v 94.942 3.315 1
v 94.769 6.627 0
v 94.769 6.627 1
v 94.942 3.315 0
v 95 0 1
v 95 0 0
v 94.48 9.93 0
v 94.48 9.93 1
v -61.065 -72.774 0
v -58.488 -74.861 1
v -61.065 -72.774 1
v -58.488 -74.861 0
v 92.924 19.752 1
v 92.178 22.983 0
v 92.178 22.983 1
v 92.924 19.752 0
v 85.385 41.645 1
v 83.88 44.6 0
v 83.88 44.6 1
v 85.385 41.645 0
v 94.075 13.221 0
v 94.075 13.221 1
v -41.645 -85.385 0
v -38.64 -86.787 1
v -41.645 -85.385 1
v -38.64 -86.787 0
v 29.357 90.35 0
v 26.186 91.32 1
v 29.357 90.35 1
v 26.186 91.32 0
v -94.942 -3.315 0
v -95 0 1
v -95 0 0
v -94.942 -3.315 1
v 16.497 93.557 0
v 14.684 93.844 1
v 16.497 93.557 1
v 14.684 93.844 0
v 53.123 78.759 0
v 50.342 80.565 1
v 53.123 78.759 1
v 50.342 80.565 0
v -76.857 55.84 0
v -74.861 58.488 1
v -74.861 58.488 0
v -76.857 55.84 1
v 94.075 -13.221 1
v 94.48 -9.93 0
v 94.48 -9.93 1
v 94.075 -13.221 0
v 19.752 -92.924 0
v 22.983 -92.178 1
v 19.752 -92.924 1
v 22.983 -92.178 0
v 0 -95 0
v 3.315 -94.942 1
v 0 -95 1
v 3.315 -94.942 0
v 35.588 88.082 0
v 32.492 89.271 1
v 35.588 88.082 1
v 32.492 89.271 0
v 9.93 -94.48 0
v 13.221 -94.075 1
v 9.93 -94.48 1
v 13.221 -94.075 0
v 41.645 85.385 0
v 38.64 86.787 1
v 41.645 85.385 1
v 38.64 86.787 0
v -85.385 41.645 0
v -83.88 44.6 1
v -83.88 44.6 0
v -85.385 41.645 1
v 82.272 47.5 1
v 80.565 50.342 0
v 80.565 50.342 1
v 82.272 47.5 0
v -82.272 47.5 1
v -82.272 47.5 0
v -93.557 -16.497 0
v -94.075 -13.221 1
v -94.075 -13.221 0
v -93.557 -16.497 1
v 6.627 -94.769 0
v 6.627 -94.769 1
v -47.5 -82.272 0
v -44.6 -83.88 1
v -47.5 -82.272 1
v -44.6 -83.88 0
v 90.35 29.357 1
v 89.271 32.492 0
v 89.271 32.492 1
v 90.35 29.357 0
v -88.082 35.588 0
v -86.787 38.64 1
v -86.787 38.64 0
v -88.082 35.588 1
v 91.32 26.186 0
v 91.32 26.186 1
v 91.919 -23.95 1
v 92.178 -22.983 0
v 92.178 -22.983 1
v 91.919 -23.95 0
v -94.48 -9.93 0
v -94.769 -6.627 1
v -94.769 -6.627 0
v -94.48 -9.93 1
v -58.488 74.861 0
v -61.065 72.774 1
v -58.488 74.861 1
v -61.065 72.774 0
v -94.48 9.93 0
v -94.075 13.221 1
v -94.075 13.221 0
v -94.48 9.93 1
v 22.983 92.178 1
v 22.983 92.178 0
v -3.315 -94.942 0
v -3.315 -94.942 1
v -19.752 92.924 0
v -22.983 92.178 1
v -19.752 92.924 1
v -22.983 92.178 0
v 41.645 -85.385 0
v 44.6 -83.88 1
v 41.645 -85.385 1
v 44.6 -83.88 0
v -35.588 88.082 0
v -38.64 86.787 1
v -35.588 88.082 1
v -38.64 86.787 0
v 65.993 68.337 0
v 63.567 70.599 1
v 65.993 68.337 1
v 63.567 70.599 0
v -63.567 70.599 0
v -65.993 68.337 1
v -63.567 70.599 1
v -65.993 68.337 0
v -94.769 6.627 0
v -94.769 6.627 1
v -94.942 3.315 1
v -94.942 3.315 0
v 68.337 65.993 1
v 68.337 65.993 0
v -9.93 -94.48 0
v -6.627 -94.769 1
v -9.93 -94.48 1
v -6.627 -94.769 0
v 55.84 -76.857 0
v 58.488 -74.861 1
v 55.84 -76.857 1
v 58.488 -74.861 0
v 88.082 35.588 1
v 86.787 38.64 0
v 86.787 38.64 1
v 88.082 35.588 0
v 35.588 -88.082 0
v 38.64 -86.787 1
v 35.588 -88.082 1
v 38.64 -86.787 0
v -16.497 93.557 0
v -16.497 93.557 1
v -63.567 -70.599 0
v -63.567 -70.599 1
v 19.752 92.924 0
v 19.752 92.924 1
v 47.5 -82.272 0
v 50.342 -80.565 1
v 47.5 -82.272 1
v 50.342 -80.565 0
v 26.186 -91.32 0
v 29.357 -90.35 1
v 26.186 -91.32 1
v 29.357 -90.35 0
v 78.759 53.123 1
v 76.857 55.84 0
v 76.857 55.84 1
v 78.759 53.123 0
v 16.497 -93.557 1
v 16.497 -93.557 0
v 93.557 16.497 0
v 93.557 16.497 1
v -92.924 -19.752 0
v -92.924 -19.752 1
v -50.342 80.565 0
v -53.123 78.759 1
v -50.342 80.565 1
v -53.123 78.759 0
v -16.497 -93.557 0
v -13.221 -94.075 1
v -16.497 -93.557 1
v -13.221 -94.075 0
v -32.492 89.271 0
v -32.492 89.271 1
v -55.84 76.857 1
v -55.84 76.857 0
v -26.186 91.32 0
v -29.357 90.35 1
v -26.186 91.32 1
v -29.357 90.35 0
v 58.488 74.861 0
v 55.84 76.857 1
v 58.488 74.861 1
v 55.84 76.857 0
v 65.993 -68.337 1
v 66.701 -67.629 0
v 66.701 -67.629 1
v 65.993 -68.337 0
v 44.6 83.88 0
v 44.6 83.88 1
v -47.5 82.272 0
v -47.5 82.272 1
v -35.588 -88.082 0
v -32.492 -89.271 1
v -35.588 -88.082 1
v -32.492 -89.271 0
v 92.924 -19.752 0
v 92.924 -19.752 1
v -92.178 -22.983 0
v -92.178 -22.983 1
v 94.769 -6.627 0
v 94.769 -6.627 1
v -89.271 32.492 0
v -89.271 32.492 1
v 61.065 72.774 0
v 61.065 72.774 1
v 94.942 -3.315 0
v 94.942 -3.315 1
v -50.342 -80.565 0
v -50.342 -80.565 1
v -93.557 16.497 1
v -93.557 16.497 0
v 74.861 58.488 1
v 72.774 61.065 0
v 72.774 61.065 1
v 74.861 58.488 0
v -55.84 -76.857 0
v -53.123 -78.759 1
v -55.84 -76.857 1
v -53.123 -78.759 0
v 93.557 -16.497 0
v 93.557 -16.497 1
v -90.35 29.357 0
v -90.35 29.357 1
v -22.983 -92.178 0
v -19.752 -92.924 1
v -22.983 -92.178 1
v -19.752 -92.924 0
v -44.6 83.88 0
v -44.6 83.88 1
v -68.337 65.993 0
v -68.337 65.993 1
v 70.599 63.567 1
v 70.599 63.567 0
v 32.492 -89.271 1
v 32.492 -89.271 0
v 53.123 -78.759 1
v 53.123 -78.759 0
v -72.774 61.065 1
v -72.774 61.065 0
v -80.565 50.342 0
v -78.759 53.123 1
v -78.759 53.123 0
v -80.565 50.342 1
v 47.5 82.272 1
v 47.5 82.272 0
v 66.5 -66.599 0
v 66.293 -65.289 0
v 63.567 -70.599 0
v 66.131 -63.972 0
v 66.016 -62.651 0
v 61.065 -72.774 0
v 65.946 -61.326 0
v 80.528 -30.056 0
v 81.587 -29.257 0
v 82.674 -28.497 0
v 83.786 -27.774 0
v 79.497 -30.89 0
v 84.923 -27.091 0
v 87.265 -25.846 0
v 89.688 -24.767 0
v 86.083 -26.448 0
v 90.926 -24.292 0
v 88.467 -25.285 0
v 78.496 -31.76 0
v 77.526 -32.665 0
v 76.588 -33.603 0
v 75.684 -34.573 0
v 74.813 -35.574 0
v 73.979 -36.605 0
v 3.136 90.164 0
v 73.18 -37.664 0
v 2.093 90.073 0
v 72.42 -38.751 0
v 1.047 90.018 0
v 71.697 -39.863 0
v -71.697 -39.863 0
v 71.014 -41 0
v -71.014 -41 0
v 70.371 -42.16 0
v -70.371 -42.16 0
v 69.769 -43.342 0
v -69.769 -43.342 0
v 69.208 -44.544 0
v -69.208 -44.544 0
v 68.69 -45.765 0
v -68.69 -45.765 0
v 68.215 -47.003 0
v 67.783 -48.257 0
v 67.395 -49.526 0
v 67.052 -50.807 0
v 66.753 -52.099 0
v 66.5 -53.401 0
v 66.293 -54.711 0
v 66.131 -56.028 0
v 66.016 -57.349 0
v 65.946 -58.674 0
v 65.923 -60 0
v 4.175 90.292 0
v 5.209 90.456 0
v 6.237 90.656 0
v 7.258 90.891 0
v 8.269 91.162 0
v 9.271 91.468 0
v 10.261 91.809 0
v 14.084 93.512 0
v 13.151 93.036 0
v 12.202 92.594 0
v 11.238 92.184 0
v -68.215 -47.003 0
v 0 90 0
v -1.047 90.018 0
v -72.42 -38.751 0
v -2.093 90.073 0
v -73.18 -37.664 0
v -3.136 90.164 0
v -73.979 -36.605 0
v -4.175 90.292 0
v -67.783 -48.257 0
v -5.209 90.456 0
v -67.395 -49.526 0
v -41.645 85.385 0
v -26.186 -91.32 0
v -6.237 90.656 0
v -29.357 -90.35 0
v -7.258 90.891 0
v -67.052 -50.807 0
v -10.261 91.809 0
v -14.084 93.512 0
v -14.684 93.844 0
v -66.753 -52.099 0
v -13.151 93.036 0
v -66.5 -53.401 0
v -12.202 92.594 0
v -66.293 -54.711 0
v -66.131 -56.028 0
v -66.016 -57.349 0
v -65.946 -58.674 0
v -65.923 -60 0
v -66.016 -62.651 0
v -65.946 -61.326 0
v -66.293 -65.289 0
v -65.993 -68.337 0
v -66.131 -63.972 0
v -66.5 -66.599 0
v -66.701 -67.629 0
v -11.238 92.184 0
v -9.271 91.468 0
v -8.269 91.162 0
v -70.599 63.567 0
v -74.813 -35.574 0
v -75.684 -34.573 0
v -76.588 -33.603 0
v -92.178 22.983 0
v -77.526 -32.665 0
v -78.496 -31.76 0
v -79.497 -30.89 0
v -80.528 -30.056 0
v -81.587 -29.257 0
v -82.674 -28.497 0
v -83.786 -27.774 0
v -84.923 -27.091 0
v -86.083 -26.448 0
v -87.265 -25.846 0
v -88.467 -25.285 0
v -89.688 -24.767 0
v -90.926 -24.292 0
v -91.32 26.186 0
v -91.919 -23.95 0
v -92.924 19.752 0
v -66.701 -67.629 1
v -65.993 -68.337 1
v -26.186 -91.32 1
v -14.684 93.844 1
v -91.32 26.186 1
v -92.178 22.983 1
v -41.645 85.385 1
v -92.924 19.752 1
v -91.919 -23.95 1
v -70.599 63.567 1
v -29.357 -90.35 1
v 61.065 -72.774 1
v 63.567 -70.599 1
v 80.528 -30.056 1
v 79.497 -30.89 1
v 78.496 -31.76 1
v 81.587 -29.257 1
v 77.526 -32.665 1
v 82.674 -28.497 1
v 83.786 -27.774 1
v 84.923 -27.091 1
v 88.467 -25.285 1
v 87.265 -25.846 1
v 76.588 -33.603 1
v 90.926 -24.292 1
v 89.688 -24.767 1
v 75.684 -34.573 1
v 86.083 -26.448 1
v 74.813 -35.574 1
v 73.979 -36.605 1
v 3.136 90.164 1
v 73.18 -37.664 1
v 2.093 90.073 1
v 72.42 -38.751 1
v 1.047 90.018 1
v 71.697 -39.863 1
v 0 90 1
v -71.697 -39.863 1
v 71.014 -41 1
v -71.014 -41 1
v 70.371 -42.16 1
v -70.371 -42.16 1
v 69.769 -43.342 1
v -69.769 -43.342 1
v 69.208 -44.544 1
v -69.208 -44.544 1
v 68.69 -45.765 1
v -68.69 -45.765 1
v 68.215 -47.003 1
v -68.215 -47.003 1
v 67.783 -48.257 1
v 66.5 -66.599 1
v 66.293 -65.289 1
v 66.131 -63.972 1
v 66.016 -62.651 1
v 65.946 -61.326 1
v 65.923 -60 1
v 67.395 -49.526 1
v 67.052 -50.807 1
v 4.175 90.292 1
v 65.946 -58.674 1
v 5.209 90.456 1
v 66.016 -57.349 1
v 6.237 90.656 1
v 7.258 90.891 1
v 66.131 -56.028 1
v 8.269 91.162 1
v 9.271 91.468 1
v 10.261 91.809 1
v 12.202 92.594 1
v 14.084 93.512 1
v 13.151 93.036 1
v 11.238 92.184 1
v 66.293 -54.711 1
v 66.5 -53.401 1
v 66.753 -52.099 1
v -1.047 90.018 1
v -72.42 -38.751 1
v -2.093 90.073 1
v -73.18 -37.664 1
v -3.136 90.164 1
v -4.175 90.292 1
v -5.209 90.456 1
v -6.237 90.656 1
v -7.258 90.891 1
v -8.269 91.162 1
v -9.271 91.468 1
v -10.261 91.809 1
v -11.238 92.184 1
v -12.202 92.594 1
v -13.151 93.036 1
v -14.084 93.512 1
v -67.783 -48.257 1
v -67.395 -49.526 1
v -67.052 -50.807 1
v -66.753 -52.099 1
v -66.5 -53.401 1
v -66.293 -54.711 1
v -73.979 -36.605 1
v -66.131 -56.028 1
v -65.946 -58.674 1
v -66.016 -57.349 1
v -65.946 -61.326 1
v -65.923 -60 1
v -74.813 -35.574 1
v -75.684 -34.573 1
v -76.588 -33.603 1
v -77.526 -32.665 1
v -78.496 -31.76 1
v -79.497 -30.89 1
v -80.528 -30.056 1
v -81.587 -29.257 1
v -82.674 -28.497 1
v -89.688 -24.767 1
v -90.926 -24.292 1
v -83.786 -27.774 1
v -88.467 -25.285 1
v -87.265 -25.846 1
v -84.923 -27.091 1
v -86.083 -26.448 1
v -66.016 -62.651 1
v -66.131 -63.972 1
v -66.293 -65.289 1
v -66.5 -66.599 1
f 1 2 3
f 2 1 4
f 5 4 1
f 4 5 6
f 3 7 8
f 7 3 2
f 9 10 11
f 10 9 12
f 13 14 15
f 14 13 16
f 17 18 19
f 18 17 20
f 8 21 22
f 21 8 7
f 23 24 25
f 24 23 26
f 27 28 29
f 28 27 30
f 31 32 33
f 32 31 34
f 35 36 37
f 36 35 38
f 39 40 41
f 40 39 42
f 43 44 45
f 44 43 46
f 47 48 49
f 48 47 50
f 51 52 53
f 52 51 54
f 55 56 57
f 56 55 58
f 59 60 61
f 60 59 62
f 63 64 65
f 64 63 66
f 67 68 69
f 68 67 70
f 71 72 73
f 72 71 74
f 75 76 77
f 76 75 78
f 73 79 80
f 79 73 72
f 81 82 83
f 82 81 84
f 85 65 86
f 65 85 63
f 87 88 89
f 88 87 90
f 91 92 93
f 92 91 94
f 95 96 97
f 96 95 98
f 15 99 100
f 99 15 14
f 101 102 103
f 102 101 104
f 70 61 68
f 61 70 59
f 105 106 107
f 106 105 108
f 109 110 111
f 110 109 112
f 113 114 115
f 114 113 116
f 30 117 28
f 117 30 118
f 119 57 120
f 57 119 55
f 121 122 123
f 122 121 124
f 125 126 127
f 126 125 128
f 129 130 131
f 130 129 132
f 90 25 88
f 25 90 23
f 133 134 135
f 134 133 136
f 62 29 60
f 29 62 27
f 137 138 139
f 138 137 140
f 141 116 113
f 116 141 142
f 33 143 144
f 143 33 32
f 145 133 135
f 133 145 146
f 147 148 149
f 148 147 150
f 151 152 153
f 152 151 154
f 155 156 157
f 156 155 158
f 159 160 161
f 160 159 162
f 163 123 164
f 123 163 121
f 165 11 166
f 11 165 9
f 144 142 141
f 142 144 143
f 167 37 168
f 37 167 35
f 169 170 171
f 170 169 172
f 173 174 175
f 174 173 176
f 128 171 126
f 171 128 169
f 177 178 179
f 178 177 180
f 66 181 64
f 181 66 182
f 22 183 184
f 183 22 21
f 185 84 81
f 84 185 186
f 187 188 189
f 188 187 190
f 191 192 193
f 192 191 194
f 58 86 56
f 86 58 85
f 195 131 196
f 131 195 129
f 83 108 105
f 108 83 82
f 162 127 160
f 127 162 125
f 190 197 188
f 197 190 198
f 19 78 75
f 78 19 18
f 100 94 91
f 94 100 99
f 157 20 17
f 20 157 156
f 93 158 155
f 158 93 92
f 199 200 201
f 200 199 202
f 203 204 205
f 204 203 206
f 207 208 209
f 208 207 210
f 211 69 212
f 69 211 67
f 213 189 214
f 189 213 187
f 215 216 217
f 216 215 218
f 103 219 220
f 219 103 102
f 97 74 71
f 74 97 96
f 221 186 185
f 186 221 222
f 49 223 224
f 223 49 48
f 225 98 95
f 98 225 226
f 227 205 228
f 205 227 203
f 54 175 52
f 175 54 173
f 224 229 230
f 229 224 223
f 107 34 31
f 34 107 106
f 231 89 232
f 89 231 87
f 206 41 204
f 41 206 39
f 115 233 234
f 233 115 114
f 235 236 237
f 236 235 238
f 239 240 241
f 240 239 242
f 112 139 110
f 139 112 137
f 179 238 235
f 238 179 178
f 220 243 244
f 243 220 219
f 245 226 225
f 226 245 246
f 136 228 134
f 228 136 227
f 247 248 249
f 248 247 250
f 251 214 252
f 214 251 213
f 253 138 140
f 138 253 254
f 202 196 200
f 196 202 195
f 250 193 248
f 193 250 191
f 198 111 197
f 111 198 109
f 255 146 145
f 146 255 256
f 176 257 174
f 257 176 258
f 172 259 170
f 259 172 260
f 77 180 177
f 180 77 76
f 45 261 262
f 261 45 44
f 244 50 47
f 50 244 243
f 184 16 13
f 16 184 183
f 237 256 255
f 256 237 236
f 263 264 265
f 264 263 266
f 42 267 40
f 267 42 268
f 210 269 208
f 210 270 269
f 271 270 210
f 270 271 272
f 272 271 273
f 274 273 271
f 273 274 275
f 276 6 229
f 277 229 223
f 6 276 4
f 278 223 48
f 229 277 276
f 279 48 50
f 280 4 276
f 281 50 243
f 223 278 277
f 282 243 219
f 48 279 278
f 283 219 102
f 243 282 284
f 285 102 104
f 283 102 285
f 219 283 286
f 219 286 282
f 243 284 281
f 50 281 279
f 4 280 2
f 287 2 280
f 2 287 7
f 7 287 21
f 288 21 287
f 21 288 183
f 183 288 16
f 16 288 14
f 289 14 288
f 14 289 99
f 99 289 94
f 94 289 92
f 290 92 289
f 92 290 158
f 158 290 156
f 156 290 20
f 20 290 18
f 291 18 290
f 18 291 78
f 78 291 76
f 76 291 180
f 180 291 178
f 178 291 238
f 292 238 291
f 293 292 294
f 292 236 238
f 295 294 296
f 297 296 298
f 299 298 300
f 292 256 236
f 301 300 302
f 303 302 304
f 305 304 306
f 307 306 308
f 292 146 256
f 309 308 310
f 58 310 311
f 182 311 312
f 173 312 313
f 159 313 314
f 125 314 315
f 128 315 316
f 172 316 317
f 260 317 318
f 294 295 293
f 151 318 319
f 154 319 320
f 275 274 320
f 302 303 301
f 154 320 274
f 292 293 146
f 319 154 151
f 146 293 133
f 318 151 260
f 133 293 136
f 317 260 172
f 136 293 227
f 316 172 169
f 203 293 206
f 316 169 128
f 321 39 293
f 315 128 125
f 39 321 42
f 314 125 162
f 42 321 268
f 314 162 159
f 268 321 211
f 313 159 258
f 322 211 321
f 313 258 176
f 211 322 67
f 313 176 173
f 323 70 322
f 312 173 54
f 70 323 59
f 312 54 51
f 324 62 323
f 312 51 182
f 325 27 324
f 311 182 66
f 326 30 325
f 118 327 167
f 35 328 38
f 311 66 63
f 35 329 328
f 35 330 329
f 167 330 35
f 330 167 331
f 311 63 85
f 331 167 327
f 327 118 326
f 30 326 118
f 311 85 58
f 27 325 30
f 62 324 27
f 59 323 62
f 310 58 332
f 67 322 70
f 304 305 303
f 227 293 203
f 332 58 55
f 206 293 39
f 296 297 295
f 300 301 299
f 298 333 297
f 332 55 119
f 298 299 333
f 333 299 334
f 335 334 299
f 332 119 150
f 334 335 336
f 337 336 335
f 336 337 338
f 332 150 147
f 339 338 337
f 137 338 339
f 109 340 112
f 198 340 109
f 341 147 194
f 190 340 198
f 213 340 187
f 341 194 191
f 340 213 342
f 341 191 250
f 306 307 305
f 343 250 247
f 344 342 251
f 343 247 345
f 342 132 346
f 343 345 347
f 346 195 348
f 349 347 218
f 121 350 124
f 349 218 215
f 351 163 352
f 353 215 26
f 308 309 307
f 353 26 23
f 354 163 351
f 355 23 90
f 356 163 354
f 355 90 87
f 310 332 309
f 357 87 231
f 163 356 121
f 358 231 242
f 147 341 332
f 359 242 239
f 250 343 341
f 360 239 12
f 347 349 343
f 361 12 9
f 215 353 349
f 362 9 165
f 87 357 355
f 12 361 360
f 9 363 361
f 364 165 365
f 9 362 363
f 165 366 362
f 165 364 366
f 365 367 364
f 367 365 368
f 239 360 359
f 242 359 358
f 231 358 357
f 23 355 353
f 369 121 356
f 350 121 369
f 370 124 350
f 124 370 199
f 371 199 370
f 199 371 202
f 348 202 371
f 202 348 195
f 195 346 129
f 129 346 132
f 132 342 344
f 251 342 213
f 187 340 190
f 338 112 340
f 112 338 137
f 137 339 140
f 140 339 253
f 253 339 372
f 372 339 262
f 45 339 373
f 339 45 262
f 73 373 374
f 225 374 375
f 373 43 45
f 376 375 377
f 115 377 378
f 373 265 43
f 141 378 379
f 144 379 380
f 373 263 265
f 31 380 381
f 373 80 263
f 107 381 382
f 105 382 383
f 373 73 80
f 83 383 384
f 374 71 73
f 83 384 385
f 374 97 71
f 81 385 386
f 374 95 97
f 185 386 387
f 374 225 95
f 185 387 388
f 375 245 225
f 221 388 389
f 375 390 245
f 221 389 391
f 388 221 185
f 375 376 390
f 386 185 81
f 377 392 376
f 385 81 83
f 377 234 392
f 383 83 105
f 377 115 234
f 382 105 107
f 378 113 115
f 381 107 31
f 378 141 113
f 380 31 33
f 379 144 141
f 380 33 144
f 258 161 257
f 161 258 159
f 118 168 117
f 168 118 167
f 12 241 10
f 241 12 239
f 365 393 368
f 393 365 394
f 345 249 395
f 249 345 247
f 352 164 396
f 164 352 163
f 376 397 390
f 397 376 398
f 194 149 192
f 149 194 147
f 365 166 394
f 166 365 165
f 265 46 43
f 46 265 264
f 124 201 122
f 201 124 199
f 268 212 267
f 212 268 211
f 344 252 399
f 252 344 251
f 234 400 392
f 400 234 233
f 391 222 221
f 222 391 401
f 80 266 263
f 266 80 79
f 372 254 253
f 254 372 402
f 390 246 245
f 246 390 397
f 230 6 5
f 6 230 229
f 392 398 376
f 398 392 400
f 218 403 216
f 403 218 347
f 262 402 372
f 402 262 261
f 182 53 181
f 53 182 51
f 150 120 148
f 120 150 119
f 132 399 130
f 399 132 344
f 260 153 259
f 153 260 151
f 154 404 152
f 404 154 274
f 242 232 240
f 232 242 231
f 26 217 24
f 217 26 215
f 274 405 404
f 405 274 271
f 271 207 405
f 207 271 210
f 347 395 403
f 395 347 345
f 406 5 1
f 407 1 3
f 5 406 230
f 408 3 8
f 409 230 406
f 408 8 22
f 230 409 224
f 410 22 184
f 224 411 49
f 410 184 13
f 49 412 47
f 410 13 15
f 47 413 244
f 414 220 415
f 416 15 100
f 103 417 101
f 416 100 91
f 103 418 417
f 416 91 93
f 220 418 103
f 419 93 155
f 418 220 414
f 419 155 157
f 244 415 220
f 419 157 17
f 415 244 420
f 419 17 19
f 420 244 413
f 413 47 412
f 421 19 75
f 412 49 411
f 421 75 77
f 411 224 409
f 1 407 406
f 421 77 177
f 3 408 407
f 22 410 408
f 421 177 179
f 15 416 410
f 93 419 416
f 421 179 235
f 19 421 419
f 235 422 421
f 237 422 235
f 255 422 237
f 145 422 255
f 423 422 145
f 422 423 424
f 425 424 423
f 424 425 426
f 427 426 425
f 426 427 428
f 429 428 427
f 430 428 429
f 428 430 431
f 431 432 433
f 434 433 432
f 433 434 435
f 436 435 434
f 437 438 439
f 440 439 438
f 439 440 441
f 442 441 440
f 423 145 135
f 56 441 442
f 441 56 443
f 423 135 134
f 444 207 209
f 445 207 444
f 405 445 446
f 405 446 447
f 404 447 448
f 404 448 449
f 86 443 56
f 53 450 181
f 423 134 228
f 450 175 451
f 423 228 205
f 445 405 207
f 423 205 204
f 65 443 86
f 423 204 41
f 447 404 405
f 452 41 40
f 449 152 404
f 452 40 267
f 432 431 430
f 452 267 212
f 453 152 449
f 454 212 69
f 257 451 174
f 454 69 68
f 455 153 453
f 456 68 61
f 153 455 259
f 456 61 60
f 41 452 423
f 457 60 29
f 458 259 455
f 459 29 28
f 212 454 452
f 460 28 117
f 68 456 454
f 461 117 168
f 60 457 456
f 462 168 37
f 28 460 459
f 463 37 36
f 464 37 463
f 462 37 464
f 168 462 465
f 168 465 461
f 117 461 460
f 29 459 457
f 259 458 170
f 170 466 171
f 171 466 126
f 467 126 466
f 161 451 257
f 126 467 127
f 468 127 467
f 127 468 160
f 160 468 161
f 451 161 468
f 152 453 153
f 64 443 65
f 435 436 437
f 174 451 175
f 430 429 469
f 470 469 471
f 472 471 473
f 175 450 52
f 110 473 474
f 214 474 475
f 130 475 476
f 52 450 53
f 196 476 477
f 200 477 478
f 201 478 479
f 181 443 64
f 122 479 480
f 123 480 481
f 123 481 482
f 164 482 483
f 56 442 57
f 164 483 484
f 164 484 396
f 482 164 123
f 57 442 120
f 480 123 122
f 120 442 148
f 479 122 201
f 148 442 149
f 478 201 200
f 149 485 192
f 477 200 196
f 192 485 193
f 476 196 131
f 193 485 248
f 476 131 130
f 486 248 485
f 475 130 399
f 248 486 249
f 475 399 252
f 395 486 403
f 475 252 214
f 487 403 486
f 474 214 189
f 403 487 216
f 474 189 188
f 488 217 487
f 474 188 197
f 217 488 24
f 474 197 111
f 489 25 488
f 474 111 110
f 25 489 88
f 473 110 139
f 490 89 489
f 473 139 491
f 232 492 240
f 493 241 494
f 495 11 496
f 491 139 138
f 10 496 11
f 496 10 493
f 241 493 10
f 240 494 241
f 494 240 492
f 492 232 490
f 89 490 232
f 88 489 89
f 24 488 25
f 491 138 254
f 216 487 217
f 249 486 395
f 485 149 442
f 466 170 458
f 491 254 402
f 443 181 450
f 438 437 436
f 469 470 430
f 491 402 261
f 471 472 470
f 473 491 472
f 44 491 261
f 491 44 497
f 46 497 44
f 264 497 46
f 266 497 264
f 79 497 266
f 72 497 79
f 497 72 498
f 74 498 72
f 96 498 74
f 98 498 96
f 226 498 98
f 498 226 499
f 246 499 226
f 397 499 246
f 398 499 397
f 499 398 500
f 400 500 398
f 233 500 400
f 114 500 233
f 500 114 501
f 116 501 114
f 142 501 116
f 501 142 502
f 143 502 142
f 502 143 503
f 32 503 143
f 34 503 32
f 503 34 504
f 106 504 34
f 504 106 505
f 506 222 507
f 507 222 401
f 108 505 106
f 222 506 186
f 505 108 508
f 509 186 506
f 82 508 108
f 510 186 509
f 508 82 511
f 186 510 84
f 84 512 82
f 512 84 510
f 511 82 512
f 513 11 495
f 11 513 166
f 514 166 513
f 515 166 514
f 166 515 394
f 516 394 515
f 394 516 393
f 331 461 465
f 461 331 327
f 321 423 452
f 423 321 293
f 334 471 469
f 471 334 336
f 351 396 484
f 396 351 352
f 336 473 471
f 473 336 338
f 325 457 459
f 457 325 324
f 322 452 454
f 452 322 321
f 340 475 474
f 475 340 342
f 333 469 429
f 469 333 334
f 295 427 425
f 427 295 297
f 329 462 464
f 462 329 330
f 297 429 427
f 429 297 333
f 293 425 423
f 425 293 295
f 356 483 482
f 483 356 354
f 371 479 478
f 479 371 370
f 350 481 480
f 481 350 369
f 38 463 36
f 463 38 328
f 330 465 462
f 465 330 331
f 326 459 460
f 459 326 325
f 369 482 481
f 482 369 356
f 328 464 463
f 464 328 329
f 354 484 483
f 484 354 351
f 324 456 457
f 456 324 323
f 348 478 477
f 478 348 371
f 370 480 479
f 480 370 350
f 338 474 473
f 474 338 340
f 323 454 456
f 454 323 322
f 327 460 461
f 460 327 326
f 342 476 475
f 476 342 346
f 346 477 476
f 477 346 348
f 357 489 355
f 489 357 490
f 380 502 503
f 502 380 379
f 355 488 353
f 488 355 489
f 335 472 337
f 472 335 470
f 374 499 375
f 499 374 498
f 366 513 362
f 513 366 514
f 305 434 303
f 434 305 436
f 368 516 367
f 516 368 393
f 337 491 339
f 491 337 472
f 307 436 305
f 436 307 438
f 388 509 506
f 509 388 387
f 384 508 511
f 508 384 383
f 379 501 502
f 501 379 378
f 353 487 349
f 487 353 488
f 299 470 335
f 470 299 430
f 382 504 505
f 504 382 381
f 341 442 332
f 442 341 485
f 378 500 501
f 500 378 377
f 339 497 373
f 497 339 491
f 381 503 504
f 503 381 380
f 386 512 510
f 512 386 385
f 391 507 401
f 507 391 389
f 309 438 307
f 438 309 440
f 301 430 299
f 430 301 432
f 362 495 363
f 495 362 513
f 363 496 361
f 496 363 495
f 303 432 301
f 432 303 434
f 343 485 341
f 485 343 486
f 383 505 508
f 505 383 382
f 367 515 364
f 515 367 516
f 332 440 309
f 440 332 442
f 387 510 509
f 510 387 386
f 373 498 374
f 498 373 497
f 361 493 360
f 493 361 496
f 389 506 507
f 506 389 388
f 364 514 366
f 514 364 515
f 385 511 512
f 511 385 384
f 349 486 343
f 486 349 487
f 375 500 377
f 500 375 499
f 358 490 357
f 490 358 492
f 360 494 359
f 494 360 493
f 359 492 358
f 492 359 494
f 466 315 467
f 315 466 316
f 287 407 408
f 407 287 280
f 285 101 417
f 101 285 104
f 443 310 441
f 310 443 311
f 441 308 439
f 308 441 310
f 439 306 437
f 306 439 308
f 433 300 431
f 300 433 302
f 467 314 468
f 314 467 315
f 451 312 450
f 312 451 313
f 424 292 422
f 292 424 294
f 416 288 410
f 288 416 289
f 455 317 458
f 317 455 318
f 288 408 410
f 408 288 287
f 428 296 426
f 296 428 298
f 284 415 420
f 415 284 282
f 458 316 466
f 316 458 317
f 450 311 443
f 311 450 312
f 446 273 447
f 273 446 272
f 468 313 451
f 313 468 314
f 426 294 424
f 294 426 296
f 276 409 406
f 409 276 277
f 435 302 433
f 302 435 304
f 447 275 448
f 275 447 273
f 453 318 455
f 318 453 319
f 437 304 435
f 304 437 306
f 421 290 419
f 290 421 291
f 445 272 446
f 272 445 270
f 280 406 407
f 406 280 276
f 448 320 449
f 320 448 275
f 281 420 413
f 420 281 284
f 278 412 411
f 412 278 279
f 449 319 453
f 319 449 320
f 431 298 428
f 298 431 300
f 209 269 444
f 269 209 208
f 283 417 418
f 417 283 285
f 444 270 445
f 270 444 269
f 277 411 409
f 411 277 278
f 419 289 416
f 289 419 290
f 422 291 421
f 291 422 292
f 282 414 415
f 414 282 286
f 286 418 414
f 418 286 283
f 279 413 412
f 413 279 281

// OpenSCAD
$fn=180;
difference() {
  cylinder(r=95);
  translate([0, 120]) cylinder(r=30);
  rotate([0,0,120]) translate([0, 120]) cylinder(r=38);
  rotate([0,0,-120]) translate([0, 120]) cylinder(r=38);
}
